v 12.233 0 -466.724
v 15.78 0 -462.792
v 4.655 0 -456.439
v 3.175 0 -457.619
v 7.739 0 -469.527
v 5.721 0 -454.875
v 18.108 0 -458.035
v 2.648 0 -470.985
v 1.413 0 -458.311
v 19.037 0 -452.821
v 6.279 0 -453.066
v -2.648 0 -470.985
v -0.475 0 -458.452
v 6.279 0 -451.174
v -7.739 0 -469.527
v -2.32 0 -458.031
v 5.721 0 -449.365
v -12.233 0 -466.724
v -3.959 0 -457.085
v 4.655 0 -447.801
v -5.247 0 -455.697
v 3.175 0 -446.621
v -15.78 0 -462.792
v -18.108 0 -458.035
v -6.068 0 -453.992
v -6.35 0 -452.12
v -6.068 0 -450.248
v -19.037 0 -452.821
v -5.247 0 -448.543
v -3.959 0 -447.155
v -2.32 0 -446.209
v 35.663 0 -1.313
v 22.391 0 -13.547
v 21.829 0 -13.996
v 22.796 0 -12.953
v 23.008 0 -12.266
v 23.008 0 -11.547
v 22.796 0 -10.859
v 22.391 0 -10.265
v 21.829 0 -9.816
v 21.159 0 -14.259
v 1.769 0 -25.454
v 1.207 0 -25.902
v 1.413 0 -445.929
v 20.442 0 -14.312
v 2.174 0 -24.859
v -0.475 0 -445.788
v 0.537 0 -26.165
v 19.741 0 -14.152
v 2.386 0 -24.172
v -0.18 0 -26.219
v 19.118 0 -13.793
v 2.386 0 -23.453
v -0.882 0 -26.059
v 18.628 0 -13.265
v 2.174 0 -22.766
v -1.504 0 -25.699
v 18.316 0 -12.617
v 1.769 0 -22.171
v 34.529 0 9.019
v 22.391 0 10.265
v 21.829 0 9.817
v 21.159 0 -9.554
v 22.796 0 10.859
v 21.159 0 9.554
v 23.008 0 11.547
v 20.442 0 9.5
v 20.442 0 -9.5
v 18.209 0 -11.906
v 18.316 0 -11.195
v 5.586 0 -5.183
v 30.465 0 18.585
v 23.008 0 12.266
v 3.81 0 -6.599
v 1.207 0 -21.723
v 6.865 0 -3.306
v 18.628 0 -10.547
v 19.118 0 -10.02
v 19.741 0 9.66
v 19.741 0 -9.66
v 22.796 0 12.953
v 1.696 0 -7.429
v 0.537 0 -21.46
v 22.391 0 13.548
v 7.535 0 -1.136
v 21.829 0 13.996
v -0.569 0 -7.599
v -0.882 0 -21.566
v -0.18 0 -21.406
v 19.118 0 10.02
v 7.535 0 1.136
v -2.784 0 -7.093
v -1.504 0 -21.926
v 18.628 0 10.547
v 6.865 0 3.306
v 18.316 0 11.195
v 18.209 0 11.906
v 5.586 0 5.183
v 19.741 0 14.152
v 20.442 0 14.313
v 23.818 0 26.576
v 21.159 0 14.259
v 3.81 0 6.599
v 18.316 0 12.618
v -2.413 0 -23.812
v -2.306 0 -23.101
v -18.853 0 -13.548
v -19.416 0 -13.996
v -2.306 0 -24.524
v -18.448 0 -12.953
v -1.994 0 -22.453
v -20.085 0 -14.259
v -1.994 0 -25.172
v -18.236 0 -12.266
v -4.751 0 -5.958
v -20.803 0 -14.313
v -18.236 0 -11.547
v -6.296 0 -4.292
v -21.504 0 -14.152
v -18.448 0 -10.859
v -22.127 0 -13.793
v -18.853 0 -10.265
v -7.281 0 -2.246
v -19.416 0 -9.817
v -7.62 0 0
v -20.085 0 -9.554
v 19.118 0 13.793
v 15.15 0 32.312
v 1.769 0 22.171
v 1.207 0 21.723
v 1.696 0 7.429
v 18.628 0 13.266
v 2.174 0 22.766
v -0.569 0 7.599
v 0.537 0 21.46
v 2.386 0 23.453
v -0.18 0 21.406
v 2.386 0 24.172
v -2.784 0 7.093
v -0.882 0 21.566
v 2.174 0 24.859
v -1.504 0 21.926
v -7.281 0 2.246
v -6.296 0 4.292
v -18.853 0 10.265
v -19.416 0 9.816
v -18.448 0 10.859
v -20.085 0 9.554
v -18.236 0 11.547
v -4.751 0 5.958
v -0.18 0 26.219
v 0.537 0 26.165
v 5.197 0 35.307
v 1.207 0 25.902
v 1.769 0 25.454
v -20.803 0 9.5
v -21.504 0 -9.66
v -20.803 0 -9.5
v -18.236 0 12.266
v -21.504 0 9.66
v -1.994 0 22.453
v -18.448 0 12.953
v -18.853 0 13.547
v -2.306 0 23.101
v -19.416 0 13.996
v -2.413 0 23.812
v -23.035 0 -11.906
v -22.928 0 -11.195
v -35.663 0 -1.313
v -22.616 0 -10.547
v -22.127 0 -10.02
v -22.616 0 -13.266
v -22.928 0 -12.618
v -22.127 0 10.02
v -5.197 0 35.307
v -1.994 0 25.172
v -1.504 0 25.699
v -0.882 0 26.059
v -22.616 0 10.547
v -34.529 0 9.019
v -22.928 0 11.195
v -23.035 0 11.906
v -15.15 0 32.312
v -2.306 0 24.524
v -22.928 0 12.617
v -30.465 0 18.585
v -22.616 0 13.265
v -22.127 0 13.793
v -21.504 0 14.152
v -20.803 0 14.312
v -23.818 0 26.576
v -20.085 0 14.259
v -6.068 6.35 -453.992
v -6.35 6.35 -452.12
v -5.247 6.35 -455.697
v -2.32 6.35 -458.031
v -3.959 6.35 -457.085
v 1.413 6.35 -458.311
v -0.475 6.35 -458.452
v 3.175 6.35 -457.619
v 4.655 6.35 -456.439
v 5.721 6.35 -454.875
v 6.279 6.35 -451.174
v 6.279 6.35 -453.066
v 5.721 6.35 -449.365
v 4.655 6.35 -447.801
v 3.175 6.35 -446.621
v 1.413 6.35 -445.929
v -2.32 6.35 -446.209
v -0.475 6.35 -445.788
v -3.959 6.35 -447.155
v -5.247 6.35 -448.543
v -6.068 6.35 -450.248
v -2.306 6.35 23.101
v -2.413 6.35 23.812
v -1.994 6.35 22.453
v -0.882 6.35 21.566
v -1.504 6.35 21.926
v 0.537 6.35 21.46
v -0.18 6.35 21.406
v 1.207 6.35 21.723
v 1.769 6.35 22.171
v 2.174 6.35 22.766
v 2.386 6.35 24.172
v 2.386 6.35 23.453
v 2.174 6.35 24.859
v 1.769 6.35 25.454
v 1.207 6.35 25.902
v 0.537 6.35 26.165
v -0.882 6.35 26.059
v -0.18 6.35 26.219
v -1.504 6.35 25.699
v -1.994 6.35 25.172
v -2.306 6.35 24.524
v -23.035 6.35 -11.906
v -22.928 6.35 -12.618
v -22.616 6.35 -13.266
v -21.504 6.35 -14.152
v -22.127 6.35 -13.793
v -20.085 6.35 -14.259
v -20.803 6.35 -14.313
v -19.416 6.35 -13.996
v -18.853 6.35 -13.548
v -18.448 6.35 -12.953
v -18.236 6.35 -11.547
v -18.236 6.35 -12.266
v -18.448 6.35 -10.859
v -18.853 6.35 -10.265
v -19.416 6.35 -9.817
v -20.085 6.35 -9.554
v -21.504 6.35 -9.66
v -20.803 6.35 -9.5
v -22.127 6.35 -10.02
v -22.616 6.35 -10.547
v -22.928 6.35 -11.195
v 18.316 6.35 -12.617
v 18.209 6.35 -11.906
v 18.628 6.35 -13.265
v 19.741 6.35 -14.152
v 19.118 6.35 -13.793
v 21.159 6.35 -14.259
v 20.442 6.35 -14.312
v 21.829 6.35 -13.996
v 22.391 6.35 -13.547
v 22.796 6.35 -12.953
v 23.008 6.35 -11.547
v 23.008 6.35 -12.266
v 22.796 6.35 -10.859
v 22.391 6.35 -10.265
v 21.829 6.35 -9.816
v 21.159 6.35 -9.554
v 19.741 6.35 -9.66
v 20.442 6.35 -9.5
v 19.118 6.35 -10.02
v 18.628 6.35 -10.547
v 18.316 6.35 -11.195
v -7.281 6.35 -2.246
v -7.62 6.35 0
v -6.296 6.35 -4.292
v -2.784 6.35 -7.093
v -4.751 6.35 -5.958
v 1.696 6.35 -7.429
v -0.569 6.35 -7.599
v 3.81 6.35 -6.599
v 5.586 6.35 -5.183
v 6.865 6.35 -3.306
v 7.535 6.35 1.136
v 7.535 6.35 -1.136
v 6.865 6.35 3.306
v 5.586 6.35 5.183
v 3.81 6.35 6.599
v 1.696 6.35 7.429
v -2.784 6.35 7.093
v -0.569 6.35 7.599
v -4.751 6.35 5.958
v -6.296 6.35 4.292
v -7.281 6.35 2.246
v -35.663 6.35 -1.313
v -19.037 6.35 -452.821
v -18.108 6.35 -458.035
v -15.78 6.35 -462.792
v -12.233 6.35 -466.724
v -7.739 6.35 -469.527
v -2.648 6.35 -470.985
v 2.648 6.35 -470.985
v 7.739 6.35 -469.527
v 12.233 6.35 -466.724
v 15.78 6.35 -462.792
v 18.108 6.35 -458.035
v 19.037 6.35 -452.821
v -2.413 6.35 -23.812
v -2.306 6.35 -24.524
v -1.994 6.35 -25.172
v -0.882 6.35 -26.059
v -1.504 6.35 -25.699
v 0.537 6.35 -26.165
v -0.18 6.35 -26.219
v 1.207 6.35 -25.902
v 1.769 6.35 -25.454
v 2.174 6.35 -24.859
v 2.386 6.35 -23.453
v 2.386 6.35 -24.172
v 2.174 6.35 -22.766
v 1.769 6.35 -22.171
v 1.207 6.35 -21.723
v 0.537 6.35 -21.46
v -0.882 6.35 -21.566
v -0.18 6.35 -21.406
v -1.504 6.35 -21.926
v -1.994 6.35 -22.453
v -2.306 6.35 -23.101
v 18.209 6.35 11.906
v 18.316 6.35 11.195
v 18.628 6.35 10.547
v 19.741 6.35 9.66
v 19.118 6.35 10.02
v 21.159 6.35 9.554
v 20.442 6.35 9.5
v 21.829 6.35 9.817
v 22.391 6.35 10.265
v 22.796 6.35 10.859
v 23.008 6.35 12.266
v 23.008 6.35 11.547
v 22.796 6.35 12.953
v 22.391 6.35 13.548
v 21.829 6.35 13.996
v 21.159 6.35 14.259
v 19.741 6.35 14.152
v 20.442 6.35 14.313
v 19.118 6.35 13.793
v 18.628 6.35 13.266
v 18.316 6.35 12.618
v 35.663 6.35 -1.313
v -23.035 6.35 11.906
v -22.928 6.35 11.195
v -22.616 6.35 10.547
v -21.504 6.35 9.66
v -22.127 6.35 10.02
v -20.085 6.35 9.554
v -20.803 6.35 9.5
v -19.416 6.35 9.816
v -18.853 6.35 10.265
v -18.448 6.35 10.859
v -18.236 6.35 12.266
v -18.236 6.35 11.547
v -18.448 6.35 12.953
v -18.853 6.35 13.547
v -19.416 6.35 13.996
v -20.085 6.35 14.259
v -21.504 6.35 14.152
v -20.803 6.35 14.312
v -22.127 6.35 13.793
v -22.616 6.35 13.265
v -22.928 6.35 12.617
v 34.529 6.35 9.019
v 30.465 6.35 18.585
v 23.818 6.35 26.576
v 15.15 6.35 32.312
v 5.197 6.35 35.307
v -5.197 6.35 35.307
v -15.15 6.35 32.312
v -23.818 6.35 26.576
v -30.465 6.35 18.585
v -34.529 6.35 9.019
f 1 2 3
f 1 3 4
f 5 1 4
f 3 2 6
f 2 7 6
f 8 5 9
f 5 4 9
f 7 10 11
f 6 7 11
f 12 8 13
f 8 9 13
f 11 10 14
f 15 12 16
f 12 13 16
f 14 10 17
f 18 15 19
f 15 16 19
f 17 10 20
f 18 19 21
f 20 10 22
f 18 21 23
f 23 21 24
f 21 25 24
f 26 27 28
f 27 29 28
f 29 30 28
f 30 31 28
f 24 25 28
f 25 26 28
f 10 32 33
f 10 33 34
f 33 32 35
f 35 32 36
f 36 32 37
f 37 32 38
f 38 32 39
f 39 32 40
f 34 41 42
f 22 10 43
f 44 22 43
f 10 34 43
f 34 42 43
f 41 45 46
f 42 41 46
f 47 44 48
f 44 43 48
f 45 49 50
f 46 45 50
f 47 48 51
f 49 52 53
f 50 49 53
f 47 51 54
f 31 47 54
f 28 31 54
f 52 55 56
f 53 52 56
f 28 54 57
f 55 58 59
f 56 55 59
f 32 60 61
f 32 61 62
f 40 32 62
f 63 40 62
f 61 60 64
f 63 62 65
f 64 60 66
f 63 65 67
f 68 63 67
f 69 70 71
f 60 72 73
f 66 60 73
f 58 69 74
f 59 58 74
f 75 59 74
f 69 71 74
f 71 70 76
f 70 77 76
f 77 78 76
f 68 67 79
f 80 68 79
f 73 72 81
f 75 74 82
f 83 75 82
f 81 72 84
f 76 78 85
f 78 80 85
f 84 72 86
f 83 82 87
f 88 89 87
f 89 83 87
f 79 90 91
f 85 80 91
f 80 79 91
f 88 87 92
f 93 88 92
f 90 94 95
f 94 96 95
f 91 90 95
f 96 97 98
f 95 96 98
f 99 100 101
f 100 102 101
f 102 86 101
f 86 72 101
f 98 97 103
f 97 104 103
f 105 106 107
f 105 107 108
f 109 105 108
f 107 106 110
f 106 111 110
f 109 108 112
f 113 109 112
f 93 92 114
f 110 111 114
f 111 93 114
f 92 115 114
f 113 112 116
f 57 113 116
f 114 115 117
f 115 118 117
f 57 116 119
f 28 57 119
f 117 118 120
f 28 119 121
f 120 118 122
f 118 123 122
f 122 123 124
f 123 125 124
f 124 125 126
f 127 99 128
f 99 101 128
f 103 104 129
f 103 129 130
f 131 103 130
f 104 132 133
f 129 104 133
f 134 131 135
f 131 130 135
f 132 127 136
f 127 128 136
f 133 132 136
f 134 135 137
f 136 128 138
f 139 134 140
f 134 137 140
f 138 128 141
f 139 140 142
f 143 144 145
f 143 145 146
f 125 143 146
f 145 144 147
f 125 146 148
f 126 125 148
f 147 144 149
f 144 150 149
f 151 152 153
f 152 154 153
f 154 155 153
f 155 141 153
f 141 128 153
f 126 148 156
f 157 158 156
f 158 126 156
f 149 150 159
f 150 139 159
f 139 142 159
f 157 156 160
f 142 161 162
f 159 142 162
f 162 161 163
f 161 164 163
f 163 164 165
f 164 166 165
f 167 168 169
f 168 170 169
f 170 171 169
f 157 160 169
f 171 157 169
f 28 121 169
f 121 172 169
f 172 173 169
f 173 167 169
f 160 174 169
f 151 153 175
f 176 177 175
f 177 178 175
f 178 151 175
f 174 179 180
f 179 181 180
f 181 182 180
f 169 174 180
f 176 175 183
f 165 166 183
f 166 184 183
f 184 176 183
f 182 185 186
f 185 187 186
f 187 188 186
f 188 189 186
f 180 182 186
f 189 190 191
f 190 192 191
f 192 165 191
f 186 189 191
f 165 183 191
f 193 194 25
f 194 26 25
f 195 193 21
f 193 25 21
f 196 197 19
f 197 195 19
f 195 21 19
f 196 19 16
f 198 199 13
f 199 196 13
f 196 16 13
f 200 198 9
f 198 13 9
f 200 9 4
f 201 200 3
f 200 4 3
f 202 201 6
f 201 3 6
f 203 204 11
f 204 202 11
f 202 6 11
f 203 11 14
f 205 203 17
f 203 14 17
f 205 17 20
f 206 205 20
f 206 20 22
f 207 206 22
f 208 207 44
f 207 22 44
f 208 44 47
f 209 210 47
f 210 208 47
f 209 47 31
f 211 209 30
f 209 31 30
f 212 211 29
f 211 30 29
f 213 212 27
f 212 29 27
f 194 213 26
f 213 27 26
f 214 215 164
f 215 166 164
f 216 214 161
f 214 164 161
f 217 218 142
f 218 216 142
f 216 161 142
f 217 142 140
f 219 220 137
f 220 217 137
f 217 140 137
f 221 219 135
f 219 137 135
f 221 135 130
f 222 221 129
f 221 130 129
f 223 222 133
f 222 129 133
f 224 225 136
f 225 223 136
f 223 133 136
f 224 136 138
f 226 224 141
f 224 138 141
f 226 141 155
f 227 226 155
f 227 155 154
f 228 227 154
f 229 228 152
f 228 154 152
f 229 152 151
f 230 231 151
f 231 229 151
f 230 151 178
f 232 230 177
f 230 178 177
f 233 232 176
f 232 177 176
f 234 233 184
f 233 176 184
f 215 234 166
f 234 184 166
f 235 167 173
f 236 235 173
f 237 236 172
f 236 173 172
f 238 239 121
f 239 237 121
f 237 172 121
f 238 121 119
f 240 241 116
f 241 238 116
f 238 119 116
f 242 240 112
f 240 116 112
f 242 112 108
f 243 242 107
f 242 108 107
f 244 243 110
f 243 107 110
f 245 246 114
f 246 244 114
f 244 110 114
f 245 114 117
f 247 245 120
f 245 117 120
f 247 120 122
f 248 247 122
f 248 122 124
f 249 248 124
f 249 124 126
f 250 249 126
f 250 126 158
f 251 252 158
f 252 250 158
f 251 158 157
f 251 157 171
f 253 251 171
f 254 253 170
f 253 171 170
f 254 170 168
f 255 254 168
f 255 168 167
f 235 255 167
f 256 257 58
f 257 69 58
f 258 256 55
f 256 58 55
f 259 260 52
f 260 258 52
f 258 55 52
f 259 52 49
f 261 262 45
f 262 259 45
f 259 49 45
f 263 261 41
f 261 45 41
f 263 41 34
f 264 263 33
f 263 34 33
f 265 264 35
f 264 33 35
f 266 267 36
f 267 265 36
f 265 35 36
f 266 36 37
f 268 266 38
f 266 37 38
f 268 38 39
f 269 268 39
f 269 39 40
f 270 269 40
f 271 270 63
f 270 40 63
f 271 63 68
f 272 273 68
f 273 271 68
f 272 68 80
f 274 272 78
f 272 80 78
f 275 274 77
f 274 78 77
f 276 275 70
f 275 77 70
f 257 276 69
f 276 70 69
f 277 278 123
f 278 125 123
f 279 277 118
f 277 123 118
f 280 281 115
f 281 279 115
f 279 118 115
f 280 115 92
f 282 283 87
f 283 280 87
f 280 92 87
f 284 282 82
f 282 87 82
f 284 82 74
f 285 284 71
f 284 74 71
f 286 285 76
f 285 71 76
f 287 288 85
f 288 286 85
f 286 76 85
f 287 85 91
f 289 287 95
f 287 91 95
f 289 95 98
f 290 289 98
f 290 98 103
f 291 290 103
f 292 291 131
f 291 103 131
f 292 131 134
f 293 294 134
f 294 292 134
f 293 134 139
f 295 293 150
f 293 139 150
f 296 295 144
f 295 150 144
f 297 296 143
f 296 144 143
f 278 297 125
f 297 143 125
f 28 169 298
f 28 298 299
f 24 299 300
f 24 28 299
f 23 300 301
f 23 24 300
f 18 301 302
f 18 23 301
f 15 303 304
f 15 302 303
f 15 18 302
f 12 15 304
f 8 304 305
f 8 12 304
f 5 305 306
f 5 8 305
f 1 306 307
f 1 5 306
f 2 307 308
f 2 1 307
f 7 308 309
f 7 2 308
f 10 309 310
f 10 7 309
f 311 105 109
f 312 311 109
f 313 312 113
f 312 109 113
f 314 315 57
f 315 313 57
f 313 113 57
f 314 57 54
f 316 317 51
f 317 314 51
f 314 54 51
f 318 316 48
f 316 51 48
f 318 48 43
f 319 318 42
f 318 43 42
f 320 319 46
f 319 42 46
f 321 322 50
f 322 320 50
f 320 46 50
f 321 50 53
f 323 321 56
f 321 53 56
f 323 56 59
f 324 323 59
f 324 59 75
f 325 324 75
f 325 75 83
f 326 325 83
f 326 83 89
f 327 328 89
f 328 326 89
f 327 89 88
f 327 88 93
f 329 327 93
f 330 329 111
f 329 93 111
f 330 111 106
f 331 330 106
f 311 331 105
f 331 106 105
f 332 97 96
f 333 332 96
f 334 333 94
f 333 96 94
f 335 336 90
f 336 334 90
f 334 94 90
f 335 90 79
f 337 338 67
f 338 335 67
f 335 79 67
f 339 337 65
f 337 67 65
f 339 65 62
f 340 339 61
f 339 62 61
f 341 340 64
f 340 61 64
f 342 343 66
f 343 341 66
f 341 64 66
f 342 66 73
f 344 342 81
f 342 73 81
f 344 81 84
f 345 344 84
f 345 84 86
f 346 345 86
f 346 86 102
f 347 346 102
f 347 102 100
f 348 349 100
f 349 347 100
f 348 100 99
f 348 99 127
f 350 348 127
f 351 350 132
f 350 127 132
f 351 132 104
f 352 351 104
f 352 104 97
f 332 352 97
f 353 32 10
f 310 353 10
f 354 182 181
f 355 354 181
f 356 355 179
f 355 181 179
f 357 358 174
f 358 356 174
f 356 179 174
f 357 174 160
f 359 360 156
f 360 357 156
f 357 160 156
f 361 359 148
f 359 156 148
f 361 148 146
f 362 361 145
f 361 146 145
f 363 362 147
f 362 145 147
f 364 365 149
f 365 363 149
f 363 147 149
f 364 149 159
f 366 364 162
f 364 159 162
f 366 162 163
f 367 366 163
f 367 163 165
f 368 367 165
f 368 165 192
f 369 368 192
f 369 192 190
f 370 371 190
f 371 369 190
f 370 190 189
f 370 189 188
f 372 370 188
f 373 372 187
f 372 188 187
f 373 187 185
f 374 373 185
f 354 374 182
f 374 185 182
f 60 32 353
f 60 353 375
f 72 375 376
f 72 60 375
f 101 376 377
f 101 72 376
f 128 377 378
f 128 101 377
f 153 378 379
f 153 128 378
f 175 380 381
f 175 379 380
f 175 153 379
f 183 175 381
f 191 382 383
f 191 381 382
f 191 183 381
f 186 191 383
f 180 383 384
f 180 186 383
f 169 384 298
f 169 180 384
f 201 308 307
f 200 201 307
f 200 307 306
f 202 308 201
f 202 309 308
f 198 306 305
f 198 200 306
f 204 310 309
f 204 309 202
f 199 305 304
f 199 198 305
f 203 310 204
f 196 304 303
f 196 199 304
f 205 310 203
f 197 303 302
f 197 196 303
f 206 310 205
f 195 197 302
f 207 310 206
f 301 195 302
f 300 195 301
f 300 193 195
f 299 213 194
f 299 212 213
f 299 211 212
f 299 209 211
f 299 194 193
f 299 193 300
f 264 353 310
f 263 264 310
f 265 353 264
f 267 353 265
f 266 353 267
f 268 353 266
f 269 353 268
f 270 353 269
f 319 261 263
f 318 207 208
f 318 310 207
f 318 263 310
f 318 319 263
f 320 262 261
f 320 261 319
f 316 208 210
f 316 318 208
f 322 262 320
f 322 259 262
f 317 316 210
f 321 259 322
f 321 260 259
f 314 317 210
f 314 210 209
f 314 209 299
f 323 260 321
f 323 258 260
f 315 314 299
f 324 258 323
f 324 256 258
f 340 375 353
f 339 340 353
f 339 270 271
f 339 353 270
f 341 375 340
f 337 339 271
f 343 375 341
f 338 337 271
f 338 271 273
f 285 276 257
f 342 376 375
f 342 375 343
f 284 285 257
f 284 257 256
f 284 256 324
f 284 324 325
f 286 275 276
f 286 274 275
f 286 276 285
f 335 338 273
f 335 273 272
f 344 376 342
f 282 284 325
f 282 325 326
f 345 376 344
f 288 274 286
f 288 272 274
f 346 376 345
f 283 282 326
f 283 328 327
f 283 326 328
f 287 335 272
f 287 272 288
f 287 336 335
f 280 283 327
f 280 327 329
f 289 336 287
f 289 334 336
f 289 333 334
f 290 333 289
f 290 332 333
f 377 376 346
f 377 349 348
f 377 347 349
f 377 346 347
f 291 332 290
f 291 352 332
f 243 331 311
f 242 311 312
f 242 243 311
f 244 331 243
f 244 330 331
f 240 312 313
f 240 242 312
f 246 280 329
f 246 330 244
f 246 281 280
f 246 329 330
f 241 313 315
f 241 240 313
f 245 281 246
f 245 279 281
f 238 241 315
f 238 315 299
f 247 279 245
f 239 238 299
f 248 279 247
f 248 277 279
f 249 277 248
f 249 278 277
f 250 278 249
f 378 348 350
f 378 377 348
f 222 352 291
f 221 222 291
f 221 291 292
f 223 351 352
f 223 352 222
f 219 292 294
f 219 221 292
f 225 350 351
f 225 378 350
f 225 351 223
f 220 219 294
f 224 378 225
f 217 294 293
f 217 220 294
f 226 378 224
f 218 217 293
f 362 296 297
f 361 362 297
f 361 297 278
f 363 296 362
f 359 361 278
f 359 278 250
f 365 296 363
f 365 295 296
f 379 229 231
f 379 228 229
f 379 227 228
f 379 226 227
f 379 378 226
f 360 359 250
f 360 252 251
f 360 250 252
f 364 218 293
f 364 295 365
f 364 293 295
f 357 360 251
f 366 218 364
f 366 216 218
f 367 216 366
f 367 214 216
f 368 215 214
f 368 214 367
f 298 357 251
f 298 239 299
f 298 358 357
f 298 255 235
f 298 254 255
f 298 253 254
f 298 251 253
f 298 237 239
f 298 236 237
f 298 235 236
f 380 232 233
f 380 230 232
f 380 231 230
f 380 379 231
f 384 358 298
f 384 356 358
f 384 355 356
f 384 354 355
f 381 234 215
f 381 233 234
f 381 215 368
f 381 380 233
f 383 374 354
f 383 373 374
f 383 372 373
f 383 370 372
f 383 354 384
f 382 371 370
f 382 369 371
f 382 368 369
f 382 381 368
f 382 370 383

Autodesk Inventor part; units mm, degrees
ref_plane "YZ Plane" through (0, 0, 0) normal (1, 0, 0) x (0, 1, 0)
ref_plane "XZ Plane" through (0, 0, 0) normal (0, 1, 0) x (-1, 0, 0)
ref_plane "XY Plane" through (0, 0, 0) normal (0, 0, 1) x (1, 0, 0)
sketch "Sketch1" plane through (0, 0, 0) normal (0, 1, 0) x (-1, 0, 0)
  line L0 (0, 0) -> (0, -452.12) construction
  circle A0 centre (0, -452.12) radius 6.35
  circle A1 centre (0, 0) radius 7.62
  circle A2 centre (0, 0) radius 29.337 construction
  circle A3 centre (0, 0) radius 35.687 construction
  circle A4 centre (0, -452.12) radius 19.05 construction
  circle A5 centre (0, 0) radius 23.8125 construction
  circle A6 centre (0, -23.8125) radius 2.413
  circle A7 centre (20.6222, -11.9063) radius 2.413
  circle A8 centre (20.6222, 11.9062) radius 2.413
  circle A9 centre (0, 23.8125) radius 2.413
  circle A10 centre (-20.6222, 11.9063) radius 2.413
  circle A11 centre (-20.6222, -11.9062) radius 2.413
  line L1 (35.6628, -1.3132) -> (19.0371, -452.821)
  line L2 (-35.6628, -1.3132) -> (-19.0371, -452.821)
  arc A12 (35.6628, -1.3132) -> (-35.6628, -1.3132) centre (0, 0) ccw
  arc A13 (-19.0371, -452.821) -> (19.0371, -452.821) centre (0, -452.12) ccw
  dimension "d6" = 47.625
  dimension "d0" = 452.12
  dimension "d1" = 12.7
  dimension "d2" = 15.24
  dimension "d3" = 58.674
  dimension "d4" = 6.35
  dimension "d5" = 12.7
  dimension "d7" = 4.826
  dimension "d10" = 360
extrude "Extrusion1" add sketch "Sketch1" along normal blind 6.35
properties part number "DragBarLinkage3 Bar1"
